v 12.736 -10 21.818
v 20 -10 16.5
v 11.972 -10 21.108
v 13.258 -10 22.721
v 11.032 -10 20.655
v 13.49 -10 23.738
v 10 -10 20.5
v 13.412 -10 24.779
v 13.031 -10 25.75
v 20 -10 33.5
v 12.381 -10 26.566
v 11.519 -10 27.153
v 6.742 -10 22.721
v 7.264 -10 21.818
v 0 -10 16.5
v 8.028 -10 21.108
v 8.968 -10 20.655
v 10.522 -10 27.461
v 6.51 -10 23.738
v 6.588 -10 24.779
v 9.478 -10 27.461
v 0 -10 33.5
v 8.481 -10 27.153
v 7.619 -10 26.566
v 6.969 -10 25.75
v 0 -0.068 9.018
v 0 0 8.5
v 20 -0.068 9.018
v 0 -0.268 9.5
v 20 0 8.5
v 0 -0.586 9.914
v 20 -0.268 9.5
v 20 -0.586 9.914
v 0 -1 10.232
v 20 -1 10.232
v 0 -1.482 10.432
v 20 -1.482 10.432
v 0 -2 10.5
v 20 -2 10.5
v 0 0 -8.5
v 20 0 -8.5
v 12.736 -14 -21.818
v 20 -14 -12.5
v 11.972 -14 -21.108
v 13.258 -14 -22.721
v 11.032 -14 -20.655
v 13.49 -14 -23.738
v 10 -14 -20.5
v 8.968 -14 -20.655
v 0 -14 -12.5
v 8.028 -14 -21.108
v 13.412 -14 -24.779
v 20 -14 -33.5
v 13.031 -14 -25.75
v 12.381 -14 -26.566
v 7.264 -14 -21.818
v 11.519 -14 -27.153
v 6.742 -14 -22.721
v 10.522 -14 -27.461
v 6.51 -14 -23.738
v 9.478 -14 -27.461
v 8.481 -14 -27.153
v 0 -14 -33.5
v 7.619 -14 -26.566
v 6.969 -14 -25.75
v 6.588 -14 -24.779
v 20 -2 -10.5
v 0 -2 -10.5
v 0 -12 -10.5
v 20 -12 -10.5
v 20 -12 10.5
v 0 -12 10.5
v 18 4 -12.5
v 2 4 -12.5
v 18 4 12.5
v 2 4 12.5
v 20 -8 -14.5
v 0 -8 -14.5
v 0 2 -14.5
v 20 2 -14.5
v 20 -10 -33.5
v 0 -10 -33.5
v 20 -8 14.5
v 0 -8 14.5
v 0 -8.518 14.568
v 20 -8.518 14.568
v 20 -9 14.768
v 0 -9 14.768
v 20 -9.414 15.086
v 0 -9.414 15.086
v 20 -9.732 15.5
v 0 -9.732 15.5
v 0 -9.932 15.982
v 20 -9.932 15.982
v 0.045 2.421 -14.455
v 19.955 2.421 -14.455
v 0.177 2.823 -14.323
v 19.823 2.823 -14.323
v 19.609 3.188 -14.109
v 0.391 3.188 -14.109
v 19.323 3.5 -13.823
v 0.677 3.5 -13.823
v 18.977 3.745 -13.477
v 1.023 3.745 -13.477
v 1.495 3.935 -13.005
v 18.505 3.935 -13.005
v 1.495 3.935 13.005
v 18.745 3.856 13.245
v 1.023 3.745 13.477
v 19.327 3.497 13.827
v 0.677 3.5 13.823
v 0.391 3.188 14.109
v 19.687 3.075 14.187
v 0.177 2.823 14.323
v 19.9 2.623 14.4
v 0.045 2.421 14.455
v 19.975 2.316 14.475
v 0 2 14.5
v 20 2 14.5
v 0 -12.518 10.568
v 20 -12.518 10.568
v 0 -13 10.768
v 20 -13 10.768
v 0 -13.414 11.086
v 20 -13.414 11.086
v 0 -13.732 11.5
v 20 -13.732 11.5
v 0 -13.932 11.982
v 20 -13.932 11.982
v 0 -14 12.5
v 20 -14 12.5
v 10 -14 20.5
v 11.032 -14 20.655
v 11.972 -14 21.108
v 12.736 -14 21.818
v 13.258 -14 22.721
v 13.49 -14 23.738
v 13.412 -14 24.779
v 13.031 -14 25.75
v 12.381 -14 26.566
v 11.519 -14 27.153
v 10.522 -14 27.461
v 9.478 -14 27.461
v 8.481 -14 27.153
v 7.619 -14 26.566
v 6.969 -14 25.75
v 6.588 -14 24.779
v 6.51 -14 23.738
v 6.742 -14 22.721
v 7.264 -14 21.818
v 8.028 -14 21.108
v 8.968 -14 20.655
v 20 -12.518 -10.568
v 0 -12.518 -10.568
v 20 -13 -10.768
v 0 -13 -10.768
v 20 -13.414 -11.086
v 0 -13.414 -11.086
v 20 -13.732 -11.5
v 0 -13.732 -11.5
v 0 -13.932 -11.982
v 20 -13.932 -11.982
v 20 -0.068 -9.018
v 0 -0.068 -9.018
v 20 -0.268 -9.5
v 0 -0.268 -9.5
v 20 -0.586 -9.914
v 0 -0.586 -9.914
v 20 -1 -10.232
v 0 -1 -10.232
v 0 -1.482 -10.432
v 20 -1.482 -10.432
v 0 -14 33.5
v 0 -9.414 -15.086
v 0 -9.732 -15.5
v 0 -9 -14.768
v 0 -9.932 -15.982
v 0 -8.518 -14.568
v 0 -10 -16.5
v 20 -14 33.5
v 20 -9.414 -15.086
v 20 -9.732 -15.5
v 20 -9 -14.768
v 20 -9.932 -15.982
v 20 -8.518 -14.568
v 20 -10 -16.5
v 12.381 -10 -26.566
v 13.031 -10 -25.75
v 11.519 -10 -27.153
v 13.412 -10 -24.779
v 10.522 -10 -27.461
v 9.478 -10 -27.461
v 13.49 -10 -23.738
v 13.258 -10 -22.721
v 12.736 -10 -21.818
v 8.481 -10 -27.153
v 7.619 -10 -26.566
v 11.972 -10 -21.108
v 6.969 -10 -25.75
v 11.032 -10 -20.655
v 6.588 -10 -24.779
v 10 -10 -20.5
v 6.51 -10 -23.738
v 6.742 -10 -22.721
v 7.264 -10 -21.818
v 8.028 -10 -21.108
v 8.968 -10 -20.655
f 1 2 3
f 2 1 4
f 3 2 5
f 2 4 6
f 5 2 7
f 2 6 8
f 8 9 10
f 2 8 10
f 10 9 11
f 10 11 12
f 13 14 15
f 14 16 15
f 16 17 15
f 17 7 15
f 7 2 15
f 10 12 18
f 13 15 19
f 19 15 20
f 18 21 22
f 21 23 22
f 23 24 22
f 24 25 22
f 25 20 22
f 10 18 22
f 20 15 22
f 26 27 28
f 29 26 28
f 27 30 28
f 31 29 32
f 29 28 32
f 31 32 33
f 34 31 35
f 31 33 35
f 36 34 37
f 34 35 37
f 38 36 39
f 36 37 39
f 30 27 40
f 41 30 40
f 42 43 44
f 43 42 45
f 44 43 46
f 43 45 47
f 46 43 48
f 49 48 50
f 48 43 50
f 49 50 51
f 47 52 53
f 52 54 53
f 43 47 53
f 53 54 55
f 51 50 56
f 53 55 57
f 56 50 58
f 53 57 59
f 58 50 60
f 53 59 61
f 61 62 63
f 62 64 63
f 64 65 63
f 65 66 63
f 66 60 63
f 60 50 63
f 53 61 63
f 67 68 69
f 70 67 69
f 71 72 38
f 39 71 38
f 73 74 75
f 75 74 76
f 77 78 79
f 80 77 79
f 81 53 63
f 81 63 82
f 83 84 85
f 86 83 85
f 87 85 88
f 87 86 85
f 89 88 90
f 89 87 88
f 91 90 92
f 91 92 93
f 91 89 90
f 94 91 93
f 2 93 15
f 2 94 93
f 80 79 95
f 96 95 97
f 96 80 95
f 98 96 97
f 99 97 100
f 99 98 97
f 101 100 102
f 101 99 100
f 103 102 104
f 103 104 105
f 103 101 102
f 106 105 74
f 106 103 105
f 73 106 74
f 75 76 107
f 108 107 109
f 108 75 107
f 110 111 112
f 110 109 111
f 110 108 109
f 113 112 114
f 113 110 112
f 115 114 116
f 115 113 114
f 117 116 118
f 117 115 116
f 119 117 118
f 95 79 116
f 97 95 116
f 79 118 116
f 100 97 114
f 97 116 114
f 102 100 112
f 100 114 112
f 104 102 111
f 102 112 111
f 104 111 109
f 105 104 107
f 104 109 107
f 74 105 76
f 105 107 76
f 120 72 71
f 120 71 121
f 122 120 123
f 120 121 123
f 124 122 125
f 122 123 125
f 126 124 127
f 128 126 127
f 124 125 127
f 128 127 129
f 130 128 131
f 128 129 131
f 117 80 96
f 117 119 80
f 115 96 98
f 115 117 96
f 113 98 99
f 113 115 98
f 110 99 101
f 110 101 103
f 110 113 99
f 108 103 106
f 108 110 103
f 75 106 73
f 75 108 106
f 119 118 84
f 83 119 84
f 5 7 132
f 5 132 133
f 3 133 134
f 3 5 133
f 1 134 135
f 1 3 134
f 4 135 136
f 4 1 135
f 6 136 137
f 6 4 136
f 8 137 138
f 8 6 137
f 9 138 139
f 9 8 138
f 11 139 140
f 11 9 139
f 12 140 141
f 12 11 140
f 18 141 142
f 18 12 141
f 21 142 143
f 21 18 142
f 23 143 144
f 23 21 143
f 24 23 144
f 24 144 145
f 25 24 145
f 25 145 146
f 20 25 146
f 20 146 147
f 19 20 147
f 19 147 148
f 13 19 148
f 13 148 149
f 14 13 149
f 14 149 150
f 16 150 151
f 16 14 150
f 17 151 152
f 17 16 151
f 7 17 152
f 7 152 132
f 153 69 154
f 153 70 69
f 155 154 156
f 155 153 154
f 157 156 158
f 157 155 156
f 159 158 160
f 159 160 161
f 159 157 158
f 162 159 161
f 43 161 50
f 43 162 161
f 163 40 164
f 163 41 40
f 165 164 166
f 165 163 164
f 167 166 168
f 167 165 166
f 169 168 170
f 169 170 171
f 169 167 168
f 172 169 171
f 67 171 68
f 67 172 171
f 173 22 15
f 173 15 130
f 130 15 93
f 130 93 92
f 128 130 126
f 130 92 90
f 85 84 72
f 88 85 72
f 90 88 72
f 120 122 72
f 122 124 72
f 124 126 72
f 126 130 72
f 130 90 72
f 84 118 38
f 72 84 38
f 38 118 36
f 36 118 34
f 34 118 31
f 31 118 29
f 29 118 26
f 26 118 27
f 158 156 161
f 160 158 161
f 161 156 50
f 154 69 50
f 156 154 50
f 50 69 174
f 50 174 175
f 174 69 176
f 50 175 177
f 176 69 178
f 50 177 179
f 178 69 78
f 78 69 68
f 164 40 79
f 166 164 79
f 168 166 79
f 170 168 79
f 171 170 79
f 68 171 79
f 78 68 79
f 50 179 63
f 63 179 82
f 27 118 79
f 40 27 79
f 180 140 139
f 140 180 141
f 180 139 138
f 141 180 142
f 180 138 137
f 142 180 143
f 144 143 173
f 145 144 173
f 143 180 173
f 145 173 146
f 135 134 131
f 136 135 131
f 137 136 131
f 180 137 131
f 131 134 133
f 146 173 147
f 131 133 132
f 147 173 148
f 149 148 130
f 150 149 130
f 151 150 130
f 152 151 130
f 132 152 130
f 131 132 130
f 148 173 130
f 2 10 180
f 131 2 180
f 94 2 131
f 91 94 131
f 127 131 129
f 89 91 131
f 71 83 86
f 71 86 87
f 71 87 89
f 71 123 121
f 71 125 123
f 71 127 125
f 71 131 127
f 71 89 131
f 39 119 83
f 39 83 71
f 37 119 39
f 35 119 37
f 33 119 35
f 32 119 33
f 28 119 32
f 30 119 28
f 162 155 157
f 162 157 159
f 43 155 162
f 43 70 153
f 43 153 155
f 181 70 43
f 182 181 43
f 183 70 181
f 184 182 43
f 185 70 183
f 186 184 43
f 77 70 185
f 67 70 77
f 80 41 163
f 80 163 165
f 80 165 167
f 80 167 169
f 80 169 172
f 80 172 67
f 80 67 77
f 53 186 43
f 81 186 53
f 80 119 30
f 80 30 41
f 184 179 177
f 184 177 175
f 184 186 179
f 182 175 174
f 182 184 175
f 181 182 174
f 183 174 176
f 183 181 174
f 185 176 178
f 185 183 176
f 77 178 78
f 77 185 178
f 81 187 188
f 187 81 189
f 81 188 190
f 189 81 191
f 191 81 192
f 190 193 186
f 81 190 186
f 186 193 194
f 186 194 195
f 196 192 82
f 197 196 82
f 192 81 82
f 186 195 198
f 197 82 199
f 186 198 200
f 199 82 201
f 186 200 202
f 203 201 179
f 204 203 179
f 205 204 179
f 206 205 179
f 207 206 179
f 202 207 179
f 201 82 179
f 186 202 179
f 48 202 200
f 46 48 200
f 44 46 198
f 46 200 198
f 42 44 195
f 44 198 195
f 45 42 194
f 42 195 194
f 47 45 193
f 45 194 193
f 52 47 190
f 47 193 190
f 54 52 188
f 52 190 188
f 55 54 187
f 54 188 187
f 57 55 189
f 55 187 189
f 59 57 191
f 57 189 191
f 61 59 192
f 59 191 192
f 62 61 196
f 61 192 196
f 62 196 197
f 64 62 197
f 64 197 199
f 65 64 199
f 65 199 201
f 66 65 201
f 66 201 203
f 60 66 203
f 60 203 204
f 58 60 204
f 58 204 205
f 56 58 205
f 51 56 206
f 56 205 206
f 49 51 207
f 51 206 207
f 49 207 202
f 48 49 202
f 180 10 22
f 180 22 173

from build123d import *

# Parameters (mm, degrees)
BOSS_EXTRUDE1_DEPTH = 20
SKETCH2_R           = 3.5
CUT_EXTRUDE1_DEPTH  = 4
FILLET1_R           = 2


with BuildPart() as part:
    # Sketch1 → Boss-Extrude1 (new body)
    with BuildSketch(Plane(origin=(0, 0, 0), x_dir=(0, 0, -1), z_dir=(1, 0, 0))):
        Polygon((-10.5, 0), (10.5, 0), (10.5, -14), (33.5, -14), (33.5, -10), (14.5, -10), (14.5, 4), (-14.5, 4), (-14.5, -10), (-33.5, -10), (-33.5, -14), (-10.5, -14), align=None)
    extrude(amount=BOSS_EXTRUDE1_DEPTH)

    # Sketch2 → Cut-Extrude1 (cut)
    with BuildSketch(Plane(origin=(0, -10, 0), x_dir=(1, 0, 0), z_dir=(0, 1, 0))):
        with Locations(Location((10, 24, 0), (0, 0, 270))):
            Circle(SKETCH2_R)
    cut_extrude1 = extrude(amount=-CUT_EXTRUDE1_DEPTH, mode=Mode.SUBTRACT)

    # Mirror1: Cut-Extrude1 across plane
    add(cut_extrude1.mirror(Plane.XY), mode=Mode.SUBTRACT)

    # Fillet1
    fillet1_edges = [part.edges().sort_by_distance(p)[0] for p in [
        (0, 4, 0),
        (10, -14, 10.5),
        (10, -10, 14.5),
        (10, 4, 14.5),
        (10, 4, -14.5),
        (10, -10, -14.5),
        (10, -14, -10.5),
        (10, 0, -10.5),
        (10, 0, 10.5),
        (20, 4, 0),
    ]]
    fillet(fillet1_edges, radius=FILLET1_R)


solid = part.part
